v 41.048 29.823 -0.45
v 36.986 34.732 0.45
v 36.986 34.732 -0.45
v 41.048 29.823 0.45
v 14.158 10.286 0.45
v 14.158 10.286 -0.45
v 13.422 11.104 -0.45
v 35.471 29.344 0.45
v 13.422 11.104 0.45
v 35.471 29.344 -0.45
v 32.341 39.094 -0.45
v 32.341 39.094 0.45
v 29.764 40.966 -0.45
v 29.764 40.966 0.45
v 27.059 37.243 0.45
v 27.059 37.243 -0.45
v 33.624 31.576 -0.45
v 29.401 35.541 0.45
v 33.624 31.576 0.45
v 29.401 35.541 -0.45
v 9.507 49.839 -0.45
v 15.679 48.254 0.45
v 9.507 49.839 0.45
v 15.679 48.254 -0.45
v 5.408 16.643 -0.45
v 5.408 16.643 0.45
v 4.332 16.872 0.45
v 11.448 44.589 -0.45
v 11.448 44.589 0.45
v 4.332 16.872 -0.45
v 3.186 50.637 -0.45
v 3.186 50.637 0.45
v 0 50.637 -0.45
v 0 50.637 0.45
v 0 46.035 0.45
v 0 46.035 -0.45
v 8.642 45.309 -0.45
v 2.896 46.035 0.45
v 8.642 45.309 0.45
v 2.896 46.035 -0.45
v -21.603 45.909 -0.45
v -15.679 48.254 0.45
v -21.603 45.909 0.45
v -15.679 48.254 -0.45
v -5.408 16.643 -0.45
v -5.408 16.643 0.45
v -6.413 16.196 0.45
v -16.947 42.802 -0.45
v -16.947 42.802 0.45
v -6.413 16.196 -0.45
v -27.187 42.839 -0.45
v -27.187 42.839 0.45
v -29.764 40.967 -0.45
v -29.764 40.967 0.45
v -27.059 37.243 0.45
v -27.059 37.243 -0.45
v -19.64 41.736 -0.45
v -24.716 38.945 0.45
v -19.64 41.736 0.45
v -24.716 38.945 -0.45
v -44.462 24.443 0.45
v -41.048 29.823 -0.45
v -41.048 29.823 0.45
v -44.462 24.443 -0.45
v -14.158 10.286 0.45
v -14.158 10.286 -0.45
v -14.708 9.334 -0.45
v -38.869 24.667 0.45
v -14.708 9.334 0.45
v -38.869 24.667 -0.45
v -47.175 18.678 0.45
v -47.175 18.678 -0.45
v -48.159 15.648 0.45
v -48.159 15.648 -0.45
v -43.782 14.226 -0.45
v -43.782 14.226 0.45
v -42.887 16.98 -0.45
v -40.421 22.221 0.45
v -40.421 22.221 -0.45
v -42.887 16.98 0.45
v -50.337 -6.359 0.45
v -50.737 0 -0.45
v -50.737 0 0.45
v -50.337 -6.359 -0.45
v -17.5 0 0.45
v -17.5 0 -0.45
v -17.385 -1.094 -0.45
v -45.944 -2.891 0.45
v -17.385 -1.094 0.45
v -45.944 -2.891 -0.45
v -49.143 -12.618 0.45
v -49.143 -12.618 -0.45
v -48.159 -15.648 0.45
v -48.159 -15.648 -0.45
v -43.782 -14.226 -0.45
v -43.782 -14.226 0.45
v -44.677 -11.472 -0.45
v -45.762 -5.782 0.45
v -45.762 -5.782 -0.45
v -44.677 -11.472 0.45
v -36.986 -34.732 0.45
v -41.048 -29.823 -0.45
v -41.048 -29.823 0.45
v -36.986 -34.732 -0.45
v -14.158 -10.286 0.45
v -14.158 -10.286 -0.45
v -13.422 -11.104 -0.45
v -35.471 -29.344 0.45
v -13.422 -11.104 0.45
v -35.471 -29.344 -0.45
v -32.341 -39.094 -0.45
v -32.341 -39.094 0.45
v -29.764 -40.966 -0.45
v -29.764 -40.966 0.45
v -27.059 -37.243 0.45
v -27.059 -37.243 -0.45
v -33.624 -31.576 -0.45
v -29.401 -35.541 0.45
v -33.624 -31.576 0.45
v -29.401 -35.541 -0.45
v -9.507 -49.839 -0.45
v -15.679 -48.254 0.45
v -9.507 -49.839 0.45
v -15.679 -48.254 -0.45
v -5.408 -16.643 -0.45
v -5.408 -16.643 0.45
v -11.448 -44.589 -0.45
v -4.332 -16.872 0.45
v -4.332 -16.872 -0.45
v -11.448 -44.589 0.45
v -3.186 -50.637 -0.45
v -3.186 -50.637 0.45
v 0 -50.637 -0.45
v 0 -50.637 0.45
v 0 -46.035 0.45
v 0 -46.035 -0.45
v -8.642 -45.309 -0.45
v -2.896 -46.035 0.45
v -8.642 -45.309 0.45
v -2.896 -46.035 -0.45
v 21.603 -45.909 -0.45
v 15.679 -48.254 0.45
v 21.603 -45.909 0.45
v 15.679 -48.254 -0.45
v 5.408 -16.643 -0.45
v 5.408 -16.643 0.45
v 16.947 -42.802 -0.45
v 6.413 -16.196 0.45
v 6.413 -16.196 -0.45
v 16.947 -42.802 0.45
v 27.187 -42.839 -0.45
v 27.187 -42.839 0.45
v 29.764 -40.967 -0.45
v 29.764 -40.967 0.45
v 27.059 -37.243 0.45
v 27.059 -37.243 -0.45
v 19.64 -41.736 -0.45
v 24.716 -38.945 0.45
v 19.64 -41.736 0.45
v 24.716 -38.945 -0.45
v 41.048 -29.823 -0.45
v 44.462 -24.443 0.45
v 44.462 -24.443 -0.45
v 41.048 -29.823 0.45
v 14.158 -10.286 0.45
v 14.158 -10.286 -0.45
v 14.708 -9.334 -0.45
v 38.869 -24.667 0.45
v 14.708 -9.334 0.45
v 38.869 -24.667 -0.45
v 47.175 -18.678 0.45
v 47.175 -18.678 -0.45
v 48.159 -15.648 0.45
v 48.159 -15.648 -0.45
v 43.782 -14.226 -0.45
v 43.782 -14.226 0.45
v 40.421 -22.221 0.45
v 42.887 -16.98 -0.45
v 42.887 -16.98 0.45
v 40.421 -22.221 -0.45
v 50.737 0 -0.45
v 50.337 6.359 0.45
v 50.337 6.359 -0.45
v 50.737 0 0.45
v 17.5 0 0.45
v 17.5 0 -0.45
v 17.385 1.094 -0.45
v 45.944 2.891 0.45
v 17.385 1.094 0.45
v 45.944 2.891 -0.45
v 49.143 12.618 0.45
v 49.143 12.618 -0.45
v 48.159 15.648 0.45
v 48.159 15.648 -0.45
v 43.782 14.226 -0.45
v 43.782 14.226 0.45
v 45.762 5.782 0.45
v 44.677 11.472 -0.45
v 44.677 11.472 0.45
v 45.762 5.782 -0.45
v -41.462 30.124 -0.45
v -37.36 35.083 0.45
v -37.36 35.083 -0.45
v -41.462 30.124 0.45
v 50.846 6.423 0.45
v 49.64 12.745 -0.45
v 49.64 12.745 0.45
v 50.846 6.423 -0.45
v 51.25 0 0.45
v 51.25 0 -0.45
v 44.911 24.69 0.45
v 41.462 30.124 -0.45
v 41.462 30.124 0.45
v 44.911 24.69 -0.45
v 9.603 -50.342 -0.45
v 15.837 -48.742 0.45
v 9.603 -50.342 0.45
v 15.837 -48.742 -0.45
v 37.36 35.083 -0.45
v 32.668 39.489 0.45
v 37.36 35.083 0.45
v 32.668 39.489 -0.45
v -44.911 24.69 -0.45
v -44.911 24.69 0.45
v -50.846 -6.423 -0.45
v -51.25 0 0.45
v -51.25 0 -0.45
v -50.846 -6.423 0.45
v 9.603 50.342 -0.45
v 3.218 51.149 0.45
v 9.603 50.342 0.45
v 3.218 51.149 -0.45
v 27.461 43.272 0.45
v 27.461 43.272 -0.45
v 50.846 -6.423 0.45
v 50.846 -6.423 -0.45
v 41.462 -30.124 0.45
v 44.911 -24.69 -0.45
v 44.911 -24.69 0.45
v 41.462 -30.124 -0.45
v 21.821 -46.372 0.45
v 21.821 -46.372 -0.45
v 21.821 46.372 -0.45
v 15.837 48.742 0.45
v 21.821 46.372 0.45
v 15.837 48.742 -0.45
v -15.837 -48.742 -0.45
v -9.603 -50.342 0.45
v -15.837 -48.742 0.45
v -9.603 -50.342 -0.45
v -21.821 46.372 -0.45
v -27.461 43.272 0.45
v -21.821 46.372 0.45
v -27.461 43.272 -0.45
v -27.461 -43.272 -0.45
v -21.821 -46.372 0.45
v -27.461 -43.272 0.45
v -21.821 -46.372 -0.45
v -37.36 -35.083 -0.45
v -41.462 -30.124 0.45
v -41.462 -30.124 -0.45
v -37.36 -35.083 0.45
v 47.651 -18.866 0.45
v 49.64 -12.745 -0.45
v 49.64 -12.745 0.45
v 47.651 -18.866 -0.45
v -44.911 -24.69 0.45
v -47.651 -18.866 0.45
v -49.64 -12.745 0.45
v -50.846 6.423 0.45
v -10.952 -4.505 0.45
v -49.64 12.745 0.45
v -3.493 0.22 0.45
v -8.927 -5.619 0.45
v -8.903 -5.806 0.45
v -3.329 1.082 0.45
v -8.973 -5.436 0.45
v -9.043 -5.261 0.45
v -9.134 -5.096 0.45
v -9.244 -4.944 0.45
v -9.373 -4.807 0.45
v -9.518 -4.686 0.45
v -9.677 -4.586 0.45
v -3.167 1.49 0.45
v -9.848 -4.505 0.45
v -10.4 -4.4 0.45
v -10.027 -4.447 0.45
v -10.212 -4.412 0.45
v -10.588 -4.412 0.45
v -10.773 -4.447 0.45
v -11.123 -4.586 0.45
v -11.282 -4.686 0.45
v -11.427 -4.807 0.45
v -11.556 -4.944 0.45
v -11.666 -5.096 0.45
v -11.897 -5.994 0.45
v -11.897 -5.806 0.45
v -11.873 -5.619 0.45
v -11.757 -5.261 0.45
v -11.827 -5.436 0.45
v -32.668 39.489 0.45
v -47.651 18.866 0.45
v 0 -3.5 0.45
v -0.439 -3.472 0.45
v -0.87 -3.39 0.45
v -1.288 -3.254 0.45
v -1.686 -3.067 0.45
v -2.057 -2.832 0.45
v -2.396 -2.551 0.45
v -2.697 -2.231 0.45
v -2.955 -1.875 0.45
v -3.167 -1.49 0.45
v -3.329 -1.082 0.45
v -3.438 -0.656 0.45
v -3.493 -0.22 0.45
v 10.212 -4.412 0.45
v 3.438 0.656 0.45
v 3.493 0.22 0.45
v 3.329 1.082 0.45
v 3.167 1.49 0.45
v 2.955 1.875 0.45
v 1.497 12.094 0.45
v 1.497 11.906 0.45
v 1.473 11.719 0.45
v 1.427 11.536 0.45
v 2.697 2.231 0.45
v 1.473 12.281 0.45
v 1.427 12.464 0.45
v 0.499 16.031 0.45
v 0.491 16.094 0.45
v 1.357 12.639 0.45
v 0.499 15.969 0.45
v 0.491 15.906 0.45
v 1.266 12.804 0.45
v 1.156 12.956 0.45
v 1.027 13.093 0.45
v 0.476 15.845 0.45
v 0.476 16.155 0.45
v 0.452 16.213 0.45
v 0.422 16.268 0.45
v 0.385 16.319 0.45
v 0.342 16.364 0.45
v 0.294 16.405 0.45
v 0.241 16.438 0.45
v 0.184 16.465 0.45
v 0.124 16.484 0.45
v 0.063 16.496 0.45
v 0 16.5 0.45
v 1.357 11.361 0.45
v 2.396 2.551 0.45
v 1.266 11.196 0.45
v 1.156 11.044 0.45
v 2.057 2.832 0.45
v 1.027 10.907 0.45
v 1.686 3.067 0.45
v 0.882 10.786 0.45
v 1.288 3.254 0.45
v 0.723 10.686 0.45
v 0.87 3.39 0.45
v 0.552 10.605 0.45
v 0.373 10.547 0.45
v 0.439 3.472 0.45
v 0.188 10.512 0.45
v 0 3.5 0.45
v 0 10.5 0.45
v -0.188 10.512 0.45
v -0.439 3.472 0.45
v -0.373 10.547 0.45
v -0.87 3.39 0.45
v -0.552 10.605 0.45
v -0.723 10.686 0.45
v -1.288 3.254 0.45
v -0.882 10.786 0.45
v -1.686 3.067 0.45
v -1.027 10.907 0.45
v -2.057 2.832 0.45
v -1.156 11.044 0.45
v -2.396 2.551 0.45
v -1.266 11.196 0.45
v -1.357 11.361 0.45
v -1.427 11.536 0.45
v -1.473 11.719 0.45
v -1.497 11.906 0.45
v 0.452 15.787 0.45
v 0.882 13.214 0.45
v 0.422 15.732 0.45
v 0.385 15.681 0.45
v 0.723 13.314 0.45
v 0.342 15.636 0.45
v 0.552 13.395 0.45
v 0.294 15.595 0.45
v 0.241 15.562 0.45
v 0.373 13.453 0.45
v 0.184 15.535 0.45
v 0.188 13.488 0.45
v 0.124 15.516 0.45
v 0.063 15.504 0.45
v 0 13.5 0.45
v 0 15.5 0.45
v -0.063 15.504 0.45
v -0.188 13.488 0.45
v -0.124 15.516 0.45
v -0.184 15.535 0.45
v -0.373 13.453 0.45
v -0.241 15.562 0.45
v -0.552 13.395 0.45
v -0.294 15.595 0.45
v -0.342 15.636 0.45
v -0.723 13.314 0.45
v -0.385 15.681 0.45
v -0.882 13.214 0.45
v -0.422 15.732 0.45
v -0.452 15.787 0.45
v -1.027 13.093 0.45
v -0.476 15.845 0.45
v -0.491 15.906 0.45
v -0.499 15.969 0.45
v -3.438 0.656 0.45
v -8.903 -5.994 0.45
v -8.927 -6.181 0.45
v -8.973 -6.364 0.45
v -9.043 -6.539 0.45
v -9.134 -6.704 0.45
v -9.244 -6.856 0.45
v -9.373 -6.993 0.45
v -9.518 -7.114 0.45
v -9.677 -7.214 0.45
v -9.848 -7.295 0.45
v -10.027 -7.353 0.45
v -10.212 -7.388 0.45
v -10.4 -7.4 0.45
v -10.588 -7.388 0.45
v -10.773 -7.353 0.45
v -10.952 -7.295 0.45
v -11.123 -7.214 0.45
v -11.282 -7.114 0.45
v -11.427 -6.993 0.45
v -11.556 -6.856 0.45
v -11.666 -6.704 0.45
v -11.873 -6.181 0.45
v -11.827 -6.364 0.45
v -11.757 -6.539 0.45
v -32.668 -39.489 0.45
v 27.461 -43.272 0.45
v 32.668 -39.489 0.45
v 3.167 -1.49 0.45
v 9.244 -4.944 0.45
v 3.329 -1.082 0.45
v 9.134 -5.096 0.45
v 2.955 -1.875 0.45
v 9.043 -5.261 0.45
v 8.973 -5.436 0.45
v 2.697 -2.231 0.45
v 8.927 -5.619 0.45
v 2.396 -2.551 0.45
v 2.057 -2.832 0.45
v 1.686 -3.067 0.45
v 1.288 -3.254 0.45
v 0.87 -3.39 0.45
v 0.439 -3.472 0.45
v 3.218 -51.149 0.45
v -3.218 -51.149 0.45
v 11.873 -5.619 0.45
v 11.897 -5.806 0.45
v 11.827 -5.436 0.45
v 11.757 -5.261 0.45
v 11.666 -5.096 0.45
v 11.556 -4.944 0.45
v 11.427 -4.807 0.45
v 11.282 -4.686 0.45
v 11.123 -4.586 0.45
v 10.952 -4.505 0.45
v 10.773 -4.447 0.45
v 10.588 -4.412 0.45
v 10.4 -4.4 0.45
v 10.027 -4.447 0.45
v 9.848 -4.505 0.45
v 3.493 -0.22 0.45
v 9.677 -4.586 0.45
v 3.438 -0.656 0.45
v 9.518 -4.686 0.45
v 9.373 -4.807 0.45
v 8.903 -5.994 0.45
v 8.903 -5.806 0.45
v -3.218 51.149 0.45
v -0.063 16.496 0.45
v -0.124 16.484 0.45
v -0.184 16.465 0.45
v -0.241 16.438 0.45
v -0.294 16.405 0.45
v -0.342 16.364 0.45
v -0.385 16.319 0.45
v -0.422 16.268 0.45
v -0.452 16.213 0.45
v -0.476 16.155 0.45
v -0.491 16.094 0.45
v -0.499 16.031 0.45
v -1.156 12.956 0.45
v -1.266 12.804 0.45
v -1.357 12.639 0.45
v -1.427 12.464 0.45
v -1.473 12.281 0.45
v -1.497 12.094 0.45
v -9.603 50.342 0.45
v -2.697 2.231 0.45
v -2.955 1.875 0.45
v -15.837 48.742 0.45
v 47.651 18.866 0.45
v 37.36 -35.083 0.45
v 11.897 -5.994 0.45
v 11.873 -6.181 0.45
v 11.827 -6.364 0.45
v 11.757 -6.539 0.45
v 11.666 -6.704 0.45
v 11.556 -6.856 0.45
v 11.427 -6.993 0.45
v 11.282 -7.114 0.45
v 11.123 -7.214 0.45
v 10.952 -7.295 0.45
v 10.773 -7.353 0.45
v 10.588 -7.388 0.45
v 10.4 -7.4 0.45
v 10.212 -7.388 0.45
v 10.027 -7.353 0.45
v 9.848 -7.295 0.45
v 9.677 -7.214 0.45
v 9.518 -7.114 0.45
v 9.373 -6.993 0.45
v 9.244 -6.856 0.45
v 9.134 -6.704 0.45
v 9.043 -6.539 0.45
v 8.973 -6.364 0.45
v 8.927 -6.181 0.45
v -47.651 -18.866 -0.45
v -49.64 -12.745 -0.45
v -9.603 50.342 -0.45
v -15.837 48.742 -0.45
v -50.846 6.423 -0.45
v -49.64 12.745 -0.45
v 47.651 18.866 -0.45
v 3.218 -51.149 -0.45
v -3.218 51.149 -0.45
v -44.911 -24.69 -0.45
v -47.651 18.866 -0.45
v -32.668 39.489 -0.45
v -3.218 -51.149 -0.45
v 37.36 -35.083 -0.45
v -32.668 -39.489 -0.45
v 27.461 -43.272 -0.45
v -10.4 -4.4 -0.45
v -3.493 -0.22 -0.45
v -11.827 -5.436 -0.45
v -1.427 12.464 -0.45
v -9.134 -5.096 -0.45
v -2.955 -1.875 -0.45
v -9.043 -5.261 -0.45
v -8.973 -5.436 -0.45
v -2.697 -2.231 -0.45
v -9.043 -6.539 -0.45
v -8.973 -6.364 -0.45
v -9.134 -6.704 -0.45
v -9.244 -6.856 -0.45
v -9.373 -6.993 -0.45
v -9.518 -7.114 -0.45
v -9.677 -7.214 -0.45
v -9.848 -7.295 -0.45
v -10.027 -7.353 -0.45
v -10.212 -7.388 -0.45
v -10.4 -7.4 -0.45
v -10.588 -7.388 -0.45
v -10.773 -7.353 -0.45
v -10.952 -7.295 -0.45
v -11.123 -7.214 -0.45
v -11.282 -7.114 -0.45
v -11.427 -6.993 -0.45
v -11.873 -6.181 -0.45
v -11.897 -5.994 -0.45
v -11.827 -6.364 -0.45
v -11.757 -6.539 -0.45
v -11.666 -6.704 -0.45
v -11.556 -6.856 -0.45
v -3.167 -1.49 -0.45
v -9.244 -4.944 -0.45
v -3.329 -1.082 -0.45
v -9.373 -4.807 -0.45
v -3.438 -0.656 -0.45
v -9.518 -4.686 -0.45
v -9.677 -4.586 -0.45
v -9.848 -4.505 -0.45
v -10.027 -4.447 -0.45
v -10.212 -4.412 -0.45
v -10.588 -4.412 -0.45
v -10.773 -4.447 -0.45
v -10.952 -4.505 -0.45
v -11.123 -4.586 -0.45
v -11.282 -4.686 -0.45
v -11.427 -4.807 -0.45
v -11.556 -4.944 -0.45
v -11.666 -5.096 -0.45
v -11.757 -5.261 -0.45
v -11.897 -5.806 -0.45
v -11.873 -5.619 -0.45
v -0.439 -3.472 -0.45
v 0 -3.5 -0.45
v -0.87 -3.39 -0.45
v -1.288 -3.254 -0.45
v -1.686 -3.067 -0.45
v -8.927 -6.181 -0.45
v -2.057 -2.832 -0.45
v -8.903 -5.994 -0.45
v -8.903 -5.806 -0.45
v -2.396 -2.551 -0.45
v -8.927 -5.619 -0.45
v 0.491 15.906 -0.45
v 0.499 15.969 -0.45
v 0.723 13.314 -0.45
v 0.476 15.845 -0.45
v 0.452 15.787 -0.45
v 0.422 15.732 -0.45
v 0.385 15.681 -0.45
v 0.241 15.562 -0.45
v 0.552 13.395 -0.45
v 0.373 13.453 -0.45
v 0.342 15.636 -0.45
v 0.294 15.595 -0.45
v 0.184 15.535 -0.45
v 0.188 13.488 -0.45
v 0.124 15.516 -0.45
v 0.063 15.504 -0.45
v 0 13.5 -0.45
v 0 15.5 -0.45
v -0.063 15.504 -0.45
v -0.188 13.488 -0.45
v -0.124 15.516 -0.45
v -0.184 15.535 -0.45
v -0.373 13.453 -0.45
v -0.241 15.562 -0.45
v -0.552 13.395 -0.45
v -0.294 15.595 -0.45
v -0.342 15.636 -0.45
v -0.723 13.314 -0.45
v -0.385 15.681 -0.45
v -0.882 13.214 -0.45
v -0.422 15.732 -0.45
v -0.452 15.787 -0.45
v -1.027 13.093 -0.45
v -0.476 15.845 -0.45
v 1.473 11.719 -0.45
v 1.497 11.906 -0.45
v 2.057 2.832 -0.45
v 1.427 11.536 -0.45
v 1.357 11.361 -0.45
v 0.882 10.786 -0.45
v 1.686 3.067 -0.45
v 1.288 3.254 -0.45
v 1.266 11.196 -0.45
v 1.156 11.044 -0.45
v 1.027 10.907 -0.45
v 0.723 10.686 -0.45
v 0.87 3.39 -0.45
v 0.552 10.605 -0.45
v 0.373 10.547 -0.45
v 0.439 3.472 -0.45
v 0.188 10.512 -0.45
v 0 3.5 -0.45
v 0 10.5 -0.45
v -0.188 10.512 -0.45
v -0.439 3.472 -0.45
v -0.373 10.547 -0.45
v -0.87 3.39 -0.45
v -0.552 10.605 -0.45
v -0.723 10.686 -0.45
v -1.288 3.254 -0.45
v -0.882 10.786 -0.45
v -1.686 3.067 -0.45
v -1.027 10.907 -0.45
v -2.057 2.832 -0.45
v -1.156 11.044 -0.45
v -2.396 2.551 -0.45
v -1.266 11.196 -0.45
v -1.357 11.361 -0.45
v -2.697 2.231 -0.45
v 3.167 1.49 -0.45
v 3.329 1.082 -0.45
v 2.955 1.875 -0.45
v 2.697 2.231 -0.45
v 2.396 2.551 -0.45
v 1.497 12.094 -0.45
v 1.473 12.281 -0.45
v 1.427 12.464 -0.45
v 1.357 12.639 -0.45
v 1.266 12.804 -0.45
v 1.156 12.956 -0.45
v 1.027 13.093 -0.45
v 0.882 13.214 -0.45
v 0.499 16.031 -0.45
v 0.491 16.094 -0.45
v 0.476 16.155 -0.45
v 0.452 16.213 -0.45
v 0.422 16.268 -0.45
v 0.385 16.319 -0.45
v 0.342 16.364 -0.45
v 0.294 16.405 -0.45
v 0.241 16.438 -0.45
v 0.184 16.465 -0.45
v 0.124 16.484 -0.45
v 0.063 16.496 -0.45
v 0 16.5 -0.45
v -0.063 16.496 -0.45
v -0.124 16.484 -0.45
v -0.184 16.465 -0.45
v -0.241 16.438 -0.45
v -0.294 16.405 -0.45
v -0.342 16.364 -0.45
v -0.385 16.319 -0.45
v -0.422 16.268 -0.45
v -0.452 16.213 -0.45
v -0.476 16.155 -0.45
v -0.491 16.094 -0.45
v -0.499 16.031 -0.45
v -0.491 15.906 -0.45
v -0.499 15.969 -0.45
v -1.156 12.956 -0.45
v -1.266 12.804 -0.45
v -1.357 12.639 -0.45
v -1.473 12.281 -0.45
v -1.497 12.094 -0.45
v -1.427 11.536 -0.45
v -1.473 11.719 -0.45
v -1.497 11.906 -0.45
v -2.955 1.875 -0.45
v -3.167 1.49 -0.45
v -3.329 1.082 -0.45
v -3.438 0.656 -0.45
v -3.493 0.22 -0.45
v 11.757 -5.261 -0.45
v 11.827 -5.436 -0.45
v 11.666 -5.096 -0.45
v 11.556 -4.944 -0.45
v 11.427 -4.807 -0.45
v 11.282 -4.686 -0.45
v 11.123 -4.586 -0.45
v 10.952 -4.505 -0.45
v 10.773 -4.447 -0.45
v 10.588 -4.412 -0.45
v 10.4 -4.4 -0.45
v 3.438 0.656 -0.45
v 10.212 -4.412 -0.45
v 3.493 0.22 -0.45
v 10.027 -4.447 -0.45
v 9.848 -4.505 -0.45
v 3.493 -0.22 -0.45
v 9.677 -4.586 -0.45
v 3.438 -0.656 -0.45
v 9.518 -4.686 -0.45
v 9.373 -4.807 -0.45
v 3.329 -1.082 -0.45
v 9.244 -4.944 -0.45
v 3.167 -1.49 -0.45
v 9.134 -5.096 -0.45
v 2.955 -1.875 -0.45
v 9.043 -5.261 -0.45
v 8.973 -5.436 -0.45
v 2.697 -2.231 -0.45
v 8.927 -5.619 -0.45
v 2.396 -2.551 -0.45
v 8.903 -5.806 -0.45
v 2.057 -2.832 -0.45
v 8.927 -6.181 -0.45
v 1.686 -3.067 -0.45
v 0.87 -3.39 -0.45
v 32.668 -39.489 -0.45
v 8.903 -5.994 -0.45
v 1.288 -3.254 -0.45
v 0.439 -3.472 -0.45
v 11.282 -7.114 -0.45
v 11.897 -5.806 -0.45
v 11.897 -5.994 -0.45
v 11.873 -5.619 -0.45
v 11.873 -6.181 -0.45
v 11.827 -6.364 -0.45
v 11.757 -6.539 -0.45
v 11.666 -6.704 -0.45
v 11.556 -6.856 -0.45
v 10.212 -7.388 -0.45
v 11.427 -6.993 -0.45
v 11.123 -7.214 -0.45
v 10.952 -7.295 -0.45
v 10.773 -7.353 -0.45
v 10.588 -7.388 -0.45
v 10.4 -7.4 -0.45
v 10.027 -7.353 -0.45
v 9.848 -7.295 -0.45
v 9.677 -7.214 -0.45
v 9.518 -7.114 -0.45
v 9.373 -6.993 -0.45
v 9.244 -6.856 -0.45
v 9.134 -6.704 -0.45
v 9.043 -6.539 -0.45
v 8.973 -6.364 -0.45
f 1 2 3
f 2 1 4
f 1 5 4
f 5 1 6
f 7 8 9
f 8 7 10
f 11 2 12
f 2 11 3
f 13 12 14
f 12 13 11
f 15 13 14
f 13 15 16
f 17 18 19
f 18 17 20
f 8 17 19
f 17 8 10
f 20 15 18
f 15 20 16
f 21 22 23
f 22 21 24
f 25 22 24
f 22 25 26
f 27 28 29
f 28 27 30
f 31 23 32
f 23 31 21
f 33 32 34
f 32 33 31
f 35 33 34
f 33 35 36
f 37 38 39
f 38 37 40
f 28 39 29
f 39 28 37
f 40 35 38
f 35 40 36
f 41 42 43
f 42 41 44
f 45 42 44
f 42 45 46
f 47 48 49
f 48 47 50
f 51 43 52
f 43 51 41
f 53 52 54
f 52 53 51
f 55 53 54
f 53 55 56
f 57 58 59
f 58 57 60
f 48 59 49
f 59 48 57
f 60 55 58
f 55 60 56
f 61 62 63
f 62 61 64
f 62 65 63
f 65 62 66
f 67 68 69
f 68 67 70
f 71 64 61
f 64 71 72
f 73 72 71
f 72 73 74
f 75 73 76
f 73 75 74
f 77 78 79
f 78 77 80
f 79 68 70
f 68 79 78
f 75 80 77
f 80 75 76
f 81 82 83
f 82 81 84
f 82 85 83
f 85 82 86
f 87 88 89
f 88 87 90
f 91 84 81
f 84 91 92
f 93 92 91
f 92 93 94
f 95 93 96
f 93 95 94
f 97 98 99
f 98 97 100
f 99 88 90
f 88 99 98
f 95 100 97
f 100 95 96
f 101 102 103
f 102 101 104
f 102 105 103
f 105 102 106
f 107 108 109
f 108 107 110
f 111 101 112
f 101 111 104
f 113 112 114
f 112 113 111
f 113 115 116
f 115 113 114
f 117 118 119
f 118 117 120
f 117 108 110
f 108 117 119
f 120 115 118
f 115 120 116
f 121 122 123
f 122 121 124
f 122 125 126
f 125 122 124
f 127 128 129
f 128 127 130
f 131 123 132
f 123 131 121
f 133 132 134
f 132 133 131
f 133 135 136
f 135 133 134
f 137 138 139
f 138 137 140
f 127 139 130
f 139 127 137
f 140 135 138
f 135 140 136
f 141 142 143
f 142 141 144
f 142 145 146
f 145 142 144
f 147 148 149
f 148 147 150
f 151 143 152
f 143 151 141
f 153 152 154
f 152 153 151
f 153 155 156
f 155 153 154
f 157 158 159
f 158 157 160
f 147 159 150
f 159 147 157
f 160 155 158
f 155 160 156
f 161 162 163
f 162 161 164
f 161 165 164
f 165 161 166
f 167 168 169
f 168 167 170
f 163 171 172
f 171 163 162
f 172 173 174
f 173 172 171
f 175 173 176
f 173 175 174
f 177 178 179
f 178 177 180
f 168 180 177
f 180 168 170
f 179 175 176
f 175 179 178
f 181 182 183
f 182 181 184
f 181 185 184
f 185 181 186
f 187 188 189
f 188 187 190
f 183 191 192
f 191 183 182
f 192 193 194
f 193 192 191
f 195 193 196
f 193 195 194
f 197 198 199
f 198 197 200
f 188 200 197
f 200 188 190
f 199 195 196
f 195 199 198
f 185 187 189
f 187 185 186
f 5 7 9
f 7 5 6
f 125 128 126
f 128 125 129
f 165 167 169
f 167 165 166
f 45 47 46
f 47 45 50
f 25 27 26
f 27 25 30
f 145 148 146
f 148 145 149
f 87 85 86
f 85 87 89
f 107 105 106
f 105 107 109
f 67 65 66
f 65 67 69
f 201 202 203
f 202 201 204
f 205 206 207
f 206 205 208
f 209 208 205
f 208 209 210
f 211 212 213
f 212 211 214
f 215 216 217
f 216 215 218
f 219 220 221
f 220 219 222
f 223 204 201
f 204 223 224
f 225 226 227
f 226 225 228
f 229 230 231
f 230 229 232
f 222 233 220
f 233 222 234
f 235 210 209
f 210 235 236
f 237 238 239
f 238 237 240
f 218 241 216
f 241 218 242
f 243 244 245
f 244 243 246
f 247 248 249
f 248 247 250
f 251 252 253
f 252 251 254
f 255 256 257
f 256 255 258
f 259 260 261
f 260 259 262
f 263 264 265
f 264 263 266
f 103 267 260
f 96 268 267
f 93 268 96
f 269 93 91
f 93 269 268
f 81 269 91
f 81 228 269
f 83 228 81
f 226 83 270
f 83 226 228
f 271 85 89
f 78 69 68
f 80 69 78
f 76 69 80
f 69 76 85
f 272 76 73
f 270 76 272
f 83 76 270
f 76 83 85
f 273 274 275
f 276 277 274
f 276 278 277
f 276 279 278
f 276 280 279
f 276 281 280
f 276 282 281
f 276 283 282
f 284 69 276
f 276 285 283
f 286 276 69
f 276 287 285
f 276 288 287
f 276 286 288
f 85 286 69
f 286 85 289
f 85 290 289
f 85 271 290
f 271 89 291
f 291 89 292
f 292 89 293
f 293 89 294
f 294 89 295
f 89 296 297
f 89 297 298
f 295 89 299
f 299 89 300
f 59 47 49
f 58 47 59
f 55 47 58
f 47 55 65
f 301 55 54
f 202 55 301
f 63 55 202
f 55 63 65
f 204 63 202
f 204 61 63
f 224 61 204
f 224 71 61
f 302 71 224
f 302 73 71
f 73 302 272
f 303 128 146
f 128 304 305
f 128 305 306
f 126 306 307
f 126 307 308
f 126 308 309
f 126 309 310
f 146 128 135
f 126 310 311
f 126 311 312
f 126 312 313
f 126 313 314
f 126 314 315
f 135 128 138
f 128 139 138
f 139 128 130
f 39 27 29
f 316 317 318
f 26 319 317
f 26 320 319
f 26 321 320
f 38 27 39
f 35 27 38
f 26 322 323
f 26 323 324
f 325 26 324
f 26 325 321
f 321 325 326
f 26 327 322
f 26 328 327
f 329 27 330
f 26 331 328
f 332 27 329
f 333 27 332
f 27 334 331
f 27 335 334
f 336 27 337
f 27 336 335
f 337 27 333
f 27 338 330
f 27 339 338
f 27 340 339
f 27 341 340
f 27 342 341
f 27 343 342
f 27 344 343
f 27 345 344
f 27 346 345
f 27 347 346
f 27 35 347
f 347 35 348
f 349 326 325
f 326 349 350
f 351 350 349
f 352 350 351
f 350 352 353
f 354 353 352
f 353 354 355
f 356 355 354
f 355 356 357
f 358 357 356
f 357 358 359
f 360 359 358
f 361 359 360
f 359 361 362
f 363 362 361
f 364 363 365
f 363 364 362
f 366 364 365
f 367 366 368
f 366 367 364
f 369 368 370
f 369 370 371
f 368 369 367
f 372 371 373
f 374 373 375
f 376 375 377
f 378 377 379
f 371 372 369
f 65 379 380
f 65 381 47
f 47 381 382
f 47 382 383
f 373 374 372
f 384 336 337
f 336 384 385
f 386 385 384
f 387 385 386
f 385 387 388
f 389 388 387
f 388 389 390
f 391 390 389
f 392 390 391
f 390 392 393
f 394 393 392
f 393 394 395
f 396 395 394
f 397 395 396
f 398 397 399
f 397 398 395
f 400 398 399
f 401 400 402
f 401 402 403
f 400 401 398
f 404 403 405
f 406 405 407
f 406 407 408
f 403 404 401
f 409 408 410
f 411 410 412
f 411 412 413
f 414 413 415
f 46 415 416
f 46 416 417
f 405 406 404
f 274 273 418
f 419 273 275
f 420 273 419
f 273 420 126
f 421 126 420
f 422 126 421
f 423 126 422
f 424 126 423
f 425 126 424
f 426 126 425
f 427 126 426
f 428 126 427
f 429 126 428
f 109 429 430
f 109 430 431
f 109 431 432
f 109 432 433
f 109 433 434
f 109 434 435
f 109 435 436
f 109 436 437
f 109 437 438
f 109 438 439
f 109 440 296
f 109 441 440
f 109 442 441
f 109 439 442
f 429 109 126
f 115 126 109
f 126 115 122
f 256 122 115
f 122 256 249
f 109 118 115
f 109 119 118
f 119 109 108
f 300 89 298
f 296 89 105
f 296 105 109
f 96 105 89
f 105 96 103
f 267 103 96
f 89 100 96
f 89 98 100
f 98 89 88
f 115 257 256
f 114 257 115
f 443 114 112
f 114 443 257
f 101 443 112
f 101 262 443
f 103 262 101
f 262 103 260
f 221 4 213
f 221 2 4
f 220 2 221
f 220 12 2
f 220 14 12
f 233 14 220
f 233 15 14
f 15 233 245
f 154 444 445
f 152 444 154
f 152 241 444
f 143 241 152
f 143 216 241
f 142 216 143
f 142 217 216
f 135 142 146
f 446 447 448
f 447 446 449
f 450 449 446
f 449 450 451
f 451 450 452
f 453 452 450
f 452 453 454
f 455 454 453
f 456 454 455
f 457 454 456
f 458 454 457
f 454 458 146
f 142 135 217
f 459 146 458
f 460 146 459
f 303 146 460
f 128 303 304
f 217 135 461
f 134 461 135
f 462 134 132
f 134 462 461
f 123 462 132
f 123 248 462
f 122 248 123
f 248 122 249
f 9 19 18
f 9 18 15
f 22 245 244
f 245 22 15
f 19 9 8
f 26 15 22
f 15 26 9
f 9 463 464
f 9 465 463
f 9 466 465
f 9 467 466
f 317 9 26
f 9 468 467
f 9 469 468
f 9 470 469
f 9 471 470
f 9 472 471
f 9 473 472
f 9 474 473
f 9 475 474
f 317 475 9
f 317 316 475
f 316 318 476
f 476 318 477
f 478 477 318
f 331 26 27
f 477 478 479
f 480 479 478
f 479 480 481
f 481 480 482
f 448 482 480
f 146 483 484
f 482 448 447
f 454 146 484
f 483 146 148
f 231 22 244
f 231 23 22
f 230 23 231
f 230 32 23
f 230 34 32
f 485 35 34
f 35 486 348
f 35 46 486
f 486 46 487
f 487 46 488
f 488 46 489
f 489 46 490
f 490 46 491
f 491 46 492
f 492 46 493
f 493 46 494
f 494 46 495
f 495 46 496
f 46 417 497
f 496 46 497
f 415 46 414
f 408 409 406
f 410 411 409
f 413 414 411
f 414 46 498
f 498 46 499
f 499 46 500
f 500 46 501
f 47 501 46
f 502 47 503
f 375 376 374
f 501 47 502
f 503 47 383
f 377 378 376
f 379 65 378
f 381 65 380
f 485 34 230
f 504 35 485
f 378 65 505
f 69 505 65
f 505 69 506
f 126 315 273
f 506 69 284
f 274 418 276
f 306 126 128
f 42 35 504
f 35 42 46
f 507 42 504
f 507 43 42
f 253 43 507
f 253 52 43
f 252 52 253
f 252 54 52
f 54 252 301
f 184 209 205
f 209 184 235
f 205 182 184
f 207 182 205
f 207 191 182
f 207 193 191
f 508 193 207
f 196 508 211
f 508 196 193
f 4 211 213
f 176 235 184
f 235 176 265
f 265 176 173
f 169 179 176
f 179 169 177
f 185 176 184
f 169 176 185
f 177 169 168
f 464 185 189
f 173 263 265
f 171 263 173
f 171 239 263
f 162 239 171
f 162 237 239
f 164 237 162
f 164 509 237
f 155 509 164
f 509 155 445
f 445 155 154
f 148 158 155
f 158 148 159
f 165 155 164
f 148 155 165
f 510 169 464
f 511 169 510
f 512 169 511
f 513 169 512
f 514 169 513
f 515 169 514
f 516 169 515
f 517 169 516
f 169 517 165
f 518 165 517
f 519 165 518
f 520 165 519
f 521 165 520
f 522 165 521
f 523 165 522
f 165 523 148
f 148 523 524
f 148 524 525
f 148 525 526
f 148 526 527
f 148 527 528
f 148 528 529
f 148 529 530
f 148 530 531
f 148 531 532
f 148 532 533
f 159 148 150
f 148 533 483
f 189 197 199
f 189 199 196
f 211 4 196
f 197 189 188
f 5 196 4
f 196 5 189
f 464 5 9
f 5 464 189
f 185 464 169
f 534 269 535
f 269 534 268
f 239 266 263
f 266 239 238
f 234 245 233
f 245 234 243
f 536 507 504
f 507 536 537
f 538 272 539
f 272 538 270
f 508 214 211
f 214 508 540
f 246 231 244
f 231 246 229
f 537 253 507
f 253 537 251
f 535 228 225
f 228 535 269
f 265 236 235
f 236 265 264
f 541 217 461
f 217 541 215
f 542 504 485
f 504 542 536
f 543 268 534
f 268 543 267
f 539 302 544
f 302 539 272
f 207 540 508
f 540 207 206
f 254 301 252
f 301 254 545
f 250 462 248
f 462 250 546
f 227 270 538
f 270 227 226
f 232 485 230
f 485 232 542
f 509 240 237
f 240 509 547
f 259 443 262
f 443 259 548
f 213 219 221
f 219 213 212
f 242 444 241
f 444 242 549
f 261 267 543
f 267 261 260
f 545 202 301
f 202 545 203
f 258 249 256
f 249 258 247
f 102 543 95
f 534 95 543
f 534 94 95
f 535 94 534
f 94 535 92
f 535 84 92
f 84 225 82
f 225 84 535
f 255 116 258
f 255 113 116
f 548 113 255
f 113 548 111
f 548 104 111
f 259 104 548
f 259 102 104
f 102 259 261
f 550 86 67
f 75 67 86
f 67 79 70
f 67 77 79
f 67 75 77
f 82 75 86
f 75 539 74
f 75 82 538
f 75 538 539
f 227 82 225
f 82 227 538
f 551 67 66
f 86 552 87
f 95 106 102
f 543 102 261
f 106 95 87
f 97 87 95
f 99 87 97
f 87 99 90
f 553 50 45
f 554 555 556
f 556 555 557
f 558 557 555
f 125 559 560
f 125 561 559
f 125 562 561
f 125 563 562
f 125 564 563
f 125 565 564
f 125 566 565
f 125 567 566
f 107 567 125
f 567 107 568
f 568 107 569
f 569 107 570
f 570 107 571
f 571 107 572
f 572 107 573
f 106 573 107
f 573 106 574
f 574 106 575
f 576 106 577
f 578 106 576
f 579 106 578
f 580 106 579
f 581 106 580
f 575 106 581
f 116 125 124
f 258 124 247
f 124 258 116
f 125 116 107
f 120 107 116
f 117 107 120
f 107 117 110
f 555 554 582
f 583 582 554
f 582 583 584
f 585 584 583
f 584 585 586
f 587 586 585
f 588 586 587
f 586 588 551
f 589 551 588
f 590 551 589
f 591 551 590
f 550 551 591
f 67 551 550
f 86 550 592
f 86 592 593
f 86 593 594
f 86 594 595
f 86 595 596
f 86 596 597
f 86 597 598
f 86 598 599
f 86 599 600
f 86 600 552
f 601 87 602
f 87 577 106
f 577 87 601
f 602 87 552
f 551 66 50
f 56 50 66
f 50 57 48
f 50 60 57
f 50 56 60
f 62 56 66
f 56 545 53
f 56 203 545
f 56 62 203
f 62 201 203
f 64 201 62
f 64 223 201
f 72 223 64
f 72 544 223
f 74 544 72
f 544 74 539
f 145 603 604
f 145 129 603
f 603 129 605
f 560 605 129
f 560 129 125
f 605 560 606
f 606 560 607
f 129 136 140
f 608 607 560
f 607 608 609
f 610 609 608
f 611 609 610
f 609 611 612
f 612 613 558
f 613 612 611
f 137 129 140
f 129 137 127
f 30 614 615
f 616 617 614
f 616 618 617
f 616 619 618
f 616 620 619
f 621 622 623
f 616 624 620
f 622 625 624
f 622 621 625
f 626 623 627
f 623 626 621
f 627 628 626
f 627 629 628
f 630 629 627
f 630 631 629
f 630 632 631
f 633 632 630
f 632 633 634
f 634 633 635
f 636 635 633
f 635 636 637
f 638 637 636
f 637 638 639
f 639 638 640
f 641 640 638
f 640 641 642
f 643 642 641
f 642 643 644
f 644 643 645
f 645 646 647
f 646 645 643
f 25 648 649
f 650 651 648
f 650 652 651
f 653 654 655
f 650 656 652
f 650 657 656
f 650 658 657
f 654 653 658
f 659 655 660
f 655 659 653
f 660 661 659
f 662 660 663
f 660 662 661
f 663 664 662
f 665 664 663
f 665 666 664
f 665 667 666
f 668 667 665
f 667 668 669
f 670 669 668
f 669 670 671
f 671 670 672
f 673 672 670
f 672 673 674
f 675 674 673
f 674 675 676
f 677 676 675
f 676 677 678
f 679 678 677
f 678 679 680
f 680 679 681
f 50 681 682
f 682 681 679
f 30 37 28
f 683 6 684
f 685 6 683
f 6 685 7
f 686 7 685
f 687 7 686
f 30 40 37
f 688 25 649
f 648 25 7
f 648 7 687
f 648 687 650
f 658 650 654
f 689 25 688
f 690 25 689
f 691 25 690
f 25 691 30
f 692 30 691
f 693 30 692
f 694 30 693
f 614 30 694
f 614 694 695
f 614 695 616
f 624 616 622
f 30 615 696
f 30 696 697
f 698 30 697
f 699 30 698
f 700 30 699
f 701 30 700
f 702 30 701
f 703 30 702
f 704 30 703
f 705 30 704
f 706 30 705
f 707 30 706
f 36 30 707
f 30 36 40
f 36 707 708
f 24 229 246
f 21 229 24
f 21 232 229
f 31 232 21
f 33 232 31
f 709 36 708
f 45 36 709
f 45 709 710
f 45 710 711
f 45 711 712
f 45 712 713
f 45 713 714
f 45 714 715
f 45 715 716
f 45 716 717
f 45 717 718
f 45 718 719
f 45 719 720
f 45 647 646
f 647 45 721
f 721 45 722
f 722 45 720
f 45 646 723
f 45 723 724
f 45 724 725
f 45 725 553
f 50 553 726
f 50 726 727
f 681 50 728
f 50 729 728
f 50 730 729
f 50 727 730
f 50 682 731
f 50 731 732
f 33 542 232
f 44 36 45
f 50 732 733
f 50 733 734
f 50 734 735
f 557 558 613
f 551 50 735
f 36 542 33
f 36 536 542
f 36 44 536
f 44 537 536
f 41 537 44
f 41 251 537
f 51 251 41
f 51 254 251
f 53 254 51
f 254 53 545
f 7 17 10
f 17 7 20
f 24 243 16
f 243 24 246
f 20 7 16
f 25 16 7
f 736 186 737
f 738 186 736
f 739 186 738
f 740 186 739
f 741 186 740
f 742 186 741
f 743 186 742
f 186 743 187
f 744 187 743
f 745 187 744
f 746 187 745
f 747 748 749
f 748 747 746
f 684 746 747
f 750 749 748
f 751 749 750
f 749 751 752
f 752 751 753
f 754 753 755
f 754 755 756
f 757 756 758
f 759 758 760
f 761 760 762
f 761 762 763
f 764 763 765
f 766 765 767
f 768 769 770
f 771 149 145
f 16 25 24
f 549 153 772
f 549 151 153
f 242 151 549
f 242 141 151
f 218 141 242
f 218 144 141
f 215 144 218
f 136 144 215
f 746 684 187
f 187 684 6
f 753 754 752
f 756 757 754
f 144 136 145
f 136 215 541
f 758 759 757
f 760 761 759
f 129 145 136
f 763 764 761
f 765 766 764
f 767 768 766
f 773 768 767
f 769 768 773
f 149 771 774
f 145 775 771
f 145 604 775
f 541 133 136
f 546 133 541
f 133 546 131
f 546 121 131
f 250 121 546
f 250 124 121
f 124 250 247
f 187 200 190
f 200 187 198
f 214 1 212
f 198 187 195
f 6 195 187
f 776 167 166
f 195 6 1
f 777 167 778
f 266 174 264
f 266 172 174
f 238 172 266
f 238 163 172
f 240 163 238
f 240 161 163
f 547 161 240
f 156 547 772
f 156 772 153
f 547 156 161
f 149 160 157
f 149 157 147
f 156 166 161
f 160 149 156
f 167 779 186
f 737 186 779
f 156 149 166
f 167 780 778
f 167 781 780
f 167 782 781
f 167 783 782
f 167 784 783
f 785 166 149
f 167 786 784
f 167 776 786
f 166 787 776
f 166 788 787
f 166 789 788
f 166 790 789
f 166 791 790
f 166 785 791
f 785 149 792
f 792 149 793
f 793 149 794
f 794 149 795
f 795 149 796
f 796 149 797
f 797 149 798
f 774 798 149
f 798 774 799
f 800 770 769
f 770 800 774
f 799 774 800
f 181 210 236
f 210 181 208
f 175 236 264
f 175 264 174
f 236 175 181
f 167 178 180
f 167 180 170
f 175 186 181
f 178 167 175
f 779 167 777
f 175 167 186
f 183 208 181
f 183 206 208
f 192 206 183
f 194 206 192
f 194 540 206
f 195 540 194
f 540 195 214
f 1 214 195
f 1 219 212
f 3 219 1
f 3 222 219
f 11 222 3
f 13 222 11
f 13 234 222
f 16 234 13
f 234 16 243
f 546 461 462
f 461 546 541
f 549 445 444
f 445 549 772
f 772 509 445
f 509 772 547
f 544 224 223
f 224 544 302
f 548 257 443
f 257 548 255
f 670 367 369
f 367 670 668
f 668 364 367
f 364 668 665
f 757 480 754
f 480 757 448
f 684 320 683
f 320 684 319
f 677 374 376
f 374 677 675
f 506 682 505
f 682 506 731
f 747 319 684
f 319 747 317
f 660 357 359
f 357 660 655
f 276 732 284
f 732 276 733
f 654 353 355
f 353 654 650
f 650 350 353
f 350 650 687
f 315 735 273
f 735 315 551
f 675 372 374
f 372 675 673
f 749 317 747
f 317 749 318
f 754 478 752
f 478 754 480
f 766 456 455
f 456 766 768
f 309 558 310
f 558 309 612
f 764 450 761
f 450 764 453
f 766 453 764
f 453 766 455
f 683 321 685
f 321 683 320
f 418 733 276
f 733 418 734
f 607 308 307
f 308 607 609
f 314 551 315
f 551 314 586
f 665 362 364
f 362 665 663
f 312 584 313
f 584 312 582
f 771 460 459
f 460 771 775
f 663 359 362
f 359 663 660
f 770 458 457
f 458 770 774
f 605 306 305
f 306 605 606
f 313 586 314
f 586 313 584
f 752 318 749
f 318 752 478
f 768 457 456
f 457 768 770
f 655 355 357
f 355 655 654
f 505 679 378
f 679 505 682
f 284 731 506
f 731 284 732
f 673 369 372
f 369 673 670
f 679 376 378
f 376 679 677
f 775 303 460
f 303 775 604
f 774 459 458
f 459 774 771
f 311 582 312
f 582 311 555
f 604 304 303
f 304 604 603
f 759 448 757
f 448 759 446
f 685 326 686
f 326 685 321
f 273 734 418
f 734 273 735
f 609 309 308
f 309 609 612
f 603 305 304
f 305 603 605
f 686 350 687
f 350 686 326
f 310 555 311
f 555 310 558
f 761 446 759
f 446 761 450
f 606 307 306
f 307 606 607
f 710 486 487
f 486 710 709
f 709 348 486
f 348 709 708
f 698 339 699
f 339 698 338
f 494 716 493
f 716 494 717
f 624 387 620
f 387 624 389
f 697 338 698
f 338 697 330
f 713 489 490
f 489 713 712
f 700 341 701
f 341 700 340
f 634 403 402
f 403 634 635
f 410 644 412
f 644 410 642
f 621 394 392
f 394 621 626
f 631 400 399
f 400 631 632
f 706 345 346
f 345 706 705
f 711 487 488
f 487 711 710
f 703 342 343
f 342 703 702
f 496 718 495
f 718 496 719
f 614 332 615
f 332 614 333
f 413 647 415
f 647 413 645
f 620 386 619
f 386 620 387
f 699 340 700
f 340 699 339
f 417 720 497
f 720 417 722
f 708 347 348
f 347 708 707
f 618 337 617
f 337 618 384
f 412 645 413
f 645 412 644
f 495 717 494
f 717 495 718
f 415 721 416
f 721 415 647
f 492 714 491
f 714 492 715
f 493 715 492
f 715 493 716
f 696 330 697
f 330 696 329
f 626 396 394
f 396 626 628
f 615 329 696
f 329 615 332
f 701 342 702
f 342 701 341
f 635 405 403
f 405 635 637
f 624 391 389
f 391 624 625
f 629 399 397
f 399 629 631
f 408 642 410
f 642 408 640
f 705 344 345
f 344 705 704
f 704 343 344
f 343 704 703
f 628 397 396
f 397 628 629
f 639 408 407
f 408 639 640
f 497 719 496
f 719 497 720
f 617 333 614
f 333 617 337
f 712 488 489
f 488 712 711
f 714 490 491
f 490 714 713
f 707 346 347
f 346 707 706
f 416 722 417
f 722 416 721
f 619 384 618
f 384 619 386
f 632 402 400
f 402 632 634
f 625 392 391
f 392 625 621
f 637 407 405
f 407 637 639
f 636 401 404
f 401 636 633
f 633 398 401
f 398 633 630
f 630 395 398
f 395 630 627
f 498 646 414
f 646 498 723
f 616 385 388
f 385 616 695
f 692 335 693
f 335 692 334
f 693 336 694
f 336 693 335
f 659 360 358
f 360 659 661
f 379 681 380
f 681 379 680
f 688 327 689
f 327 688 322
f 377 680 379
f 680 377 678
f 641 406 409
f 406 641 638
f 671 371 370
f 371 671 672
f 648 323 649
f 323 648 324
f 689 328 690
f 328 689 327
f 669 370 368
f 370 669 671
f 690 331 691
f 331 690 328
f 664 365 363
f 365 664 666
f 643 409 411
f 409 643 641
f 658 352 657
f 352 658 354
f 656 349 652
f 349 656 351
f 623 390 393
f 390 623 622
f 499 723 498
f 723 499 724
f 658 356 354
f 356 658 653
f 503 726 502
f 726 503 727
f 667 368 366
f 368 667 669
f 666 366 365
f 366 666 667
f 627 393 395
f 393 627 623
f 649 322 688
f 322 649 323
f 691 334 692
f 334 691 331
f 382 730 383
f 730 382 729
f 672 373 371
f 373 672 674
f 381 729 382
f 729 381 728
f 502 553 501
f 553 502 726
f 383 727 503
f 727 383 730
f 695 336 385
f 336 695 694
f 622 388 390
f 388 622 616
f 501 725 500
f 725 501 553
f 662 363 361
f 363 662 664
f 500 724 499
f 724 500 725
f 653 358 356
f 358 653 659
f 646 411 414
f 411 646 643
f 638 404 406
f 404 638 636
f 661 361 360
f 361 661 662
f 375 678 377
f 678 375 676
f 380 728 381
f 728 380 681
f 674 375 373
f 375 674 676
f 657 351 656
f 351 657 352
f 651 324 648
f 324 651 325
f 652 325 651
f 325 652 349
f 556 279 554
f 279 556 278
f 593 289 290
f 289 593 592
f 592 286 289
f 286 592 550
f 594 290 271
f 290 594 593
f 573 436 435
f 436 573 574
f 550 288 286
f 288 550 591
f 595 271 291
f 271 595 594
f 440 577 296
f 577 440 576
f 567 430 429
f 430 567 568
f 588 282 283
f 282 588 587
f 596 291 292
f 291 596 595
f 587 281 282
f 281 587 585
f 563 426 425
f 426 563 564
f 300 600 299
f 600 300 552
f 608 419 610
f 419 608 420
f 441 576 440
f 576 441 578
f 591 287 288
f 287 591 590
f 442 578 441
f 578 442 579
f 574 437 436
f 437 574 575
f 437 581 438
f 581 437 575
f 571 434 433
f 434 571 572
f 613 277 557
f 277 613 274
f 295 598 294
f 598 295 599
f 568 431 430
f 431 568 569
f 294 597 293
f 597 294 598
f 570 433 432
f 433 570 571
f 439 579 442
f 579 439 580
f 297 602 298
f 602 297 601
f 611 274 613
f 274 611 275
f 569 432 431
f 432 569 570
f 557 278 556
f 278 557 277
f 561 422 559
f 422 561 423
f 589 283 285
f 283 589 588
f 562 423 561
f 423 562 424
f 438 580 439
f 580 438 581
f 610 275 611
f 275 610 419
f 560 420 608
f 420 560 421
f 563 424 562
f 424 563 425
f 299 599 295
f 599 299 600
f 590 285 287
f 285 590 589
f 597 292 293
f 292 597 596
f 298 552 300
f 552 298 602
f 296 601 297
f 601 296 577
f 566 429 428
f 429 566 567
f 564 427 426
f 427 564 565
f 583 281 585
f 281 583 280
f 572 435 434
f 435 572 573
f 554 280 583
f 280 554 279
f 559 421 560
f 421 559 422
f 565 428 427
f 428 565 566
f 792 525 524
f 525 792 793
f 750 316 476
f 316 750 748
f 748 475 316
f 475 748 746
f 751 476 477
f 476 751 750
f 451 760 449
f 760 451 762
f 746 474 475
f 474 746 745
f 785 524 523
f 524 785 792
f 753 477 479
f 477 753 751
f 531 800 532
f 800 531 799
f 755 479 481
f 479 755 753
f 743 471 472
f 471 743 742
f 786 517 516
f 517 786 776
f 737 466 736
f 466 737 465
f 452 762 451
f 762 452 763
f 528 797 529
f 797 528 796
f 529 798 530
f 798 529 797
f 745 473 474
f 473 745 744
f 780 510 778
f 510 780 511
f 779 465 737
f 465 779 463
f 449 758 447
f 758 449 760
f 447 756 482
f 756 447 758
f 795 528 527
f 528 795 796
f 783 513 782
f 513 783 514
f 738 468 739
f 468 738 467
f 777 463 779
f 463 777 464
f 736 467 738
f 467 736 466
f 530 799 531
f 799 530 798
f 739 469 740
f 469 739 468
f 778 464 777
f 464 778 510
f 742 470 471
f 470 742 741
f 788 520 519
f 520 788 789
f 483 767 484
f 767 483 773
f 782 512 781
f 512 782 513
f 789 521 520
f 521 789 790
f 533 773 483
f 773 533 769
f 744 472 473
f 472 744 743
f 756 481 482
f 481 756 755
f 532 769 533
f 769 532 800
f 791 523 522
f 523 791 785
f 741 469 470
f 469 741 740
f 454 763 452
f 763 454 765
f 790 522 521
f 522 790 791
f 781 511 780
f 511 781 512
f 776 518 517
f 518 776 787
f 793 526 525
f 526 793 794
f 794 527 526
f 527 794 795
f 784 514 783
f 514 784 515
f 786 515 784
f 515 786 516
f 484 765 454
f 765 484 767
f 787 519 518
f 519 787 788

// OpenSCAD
/*
parametric optical chopper "blades". It creates a cylinder with slits that are used to let light through with certain intervals and for specified amounts of time. 
    parameters that can be defined by the user:
    - rotation frequency
    - blade diameter
    - blade thickness
    - duration of each scanning line
    - amount of time the stimulus light should be blocked.
    - diameter of the central holding part
    - style of the slit to be created
*/

/*
units:
mm, degrees, milliseconds, Hz
*/

rotateF = 50;/*rotation frequency degrees*/
bladeD = 102.5;/*blade diameter mm*/
bladeT = 0.9;/*blade thickn mm*/
lineDur = 2; /*total time in between slits ms*/
blankTime = 1.8;/*time in covered area ms*/
centerD = 35;/*central circle mm*/
slitStyle = 0; /*type of slit to be used 
                0 = regular "pizza slice"
                1 = shape1...*/
 

 
nSlits =  (1000/rotateF)/lineDur;
slitSize = (360*(lineDur-blankTime))/
           (1000/rotateF); //in degrees
/*the next variable is to "trick" the
optical chopper, since it normally 
uses blades that have evenly spaced slits,
with equal block and pass periods. Since
the device has a feedback system that aligns
input signal with feedback, our "uneven"
blades would probably make it go crazy*/

slitLineDur = ((360*(lineDur/2))/              (1000/rotateF)); //in degree
         
//echo(slitLineDur);
module slit(slitL,slitH,slitSize1){
///////// main slit//////////
intersection(){
    cylinder(h=slitH+30,
          d=slitL,
          center=true,
          $fn=50);
    cube([slitL/2,
          slitL/2,
          slitH+10],
          center=false);
    rotate([0,0,-90+slitSize1]){
    //translate([slitL/2,slitL/2,0]){
    cube([slitL/2,
          slitL/2,
          slitH+20],
          center=false);
 }//end rotate
}//end intersection
////////////////////////////

}//end module 

module customSlit1(slitL,slitH){}



module allSlits(slitNum,slitL,slitH,midHole){
difference(){
    union(){
  for (a =[1:slitNum]){
    rotate([0,0,(a*(360/slitNum))]){ 
        slit(bladeD*0.99,bladeT,slitSize);
    difference(){
        slit(bladeD*0.99,bladeT,slitLineDur);
     translate([0.001,0.001,0]){
        slit(bladeD*0.90,bladeT,slitLineDur);
         }//end translate
     }//difference
 }//end rotate
 }//end for
  
     
  
 }//end union
 cylinder(d=midHole,h=80,center=true);
}//end difference
}//end module

module mount_holes(){
    cylinder(h=10,d=7,center=true,$fn=50);
    //cylinder(h=5,d=21,center=true,$fn=3);
    translate([16,0,0]){
        //text("1",5);
    cylinder(h=5,d=1,center=true,$fn=50);
        }//end translate
    translate([12,0,0]){
        //text("1",5);
    cylinder(h=10,d=3,center=true,$fn=50);
        }//end translate
        
    translate([-5.9,10.4,0]){
        //text("2",5);
    cylinder(h=10,d=3,center=true,$fn=50);
        }//end translate
    translate([-5.9,-10.4,0]){
        //text("3",5);
    cylinder(h=10,d=3,center=true,$fn=50);
        }//end translate
    }//end module
// 
difference(){
    difference(){
        cylinder(h=bladeT,
            d1=bladeD,
            d2=bladeD,
            center=true,$fn=50);
        translate([0,0,-2*bladeT]){
            if (slitStyle==0) {
                allSlits(nSlits,bladeD-10,          bladeT,centerD);}//end if
            if (slitStyle==1) {}//end if    
        }//end translate
//
}//end difference
rotate([0,0,90])    
mount_holes();}//end difference
    
